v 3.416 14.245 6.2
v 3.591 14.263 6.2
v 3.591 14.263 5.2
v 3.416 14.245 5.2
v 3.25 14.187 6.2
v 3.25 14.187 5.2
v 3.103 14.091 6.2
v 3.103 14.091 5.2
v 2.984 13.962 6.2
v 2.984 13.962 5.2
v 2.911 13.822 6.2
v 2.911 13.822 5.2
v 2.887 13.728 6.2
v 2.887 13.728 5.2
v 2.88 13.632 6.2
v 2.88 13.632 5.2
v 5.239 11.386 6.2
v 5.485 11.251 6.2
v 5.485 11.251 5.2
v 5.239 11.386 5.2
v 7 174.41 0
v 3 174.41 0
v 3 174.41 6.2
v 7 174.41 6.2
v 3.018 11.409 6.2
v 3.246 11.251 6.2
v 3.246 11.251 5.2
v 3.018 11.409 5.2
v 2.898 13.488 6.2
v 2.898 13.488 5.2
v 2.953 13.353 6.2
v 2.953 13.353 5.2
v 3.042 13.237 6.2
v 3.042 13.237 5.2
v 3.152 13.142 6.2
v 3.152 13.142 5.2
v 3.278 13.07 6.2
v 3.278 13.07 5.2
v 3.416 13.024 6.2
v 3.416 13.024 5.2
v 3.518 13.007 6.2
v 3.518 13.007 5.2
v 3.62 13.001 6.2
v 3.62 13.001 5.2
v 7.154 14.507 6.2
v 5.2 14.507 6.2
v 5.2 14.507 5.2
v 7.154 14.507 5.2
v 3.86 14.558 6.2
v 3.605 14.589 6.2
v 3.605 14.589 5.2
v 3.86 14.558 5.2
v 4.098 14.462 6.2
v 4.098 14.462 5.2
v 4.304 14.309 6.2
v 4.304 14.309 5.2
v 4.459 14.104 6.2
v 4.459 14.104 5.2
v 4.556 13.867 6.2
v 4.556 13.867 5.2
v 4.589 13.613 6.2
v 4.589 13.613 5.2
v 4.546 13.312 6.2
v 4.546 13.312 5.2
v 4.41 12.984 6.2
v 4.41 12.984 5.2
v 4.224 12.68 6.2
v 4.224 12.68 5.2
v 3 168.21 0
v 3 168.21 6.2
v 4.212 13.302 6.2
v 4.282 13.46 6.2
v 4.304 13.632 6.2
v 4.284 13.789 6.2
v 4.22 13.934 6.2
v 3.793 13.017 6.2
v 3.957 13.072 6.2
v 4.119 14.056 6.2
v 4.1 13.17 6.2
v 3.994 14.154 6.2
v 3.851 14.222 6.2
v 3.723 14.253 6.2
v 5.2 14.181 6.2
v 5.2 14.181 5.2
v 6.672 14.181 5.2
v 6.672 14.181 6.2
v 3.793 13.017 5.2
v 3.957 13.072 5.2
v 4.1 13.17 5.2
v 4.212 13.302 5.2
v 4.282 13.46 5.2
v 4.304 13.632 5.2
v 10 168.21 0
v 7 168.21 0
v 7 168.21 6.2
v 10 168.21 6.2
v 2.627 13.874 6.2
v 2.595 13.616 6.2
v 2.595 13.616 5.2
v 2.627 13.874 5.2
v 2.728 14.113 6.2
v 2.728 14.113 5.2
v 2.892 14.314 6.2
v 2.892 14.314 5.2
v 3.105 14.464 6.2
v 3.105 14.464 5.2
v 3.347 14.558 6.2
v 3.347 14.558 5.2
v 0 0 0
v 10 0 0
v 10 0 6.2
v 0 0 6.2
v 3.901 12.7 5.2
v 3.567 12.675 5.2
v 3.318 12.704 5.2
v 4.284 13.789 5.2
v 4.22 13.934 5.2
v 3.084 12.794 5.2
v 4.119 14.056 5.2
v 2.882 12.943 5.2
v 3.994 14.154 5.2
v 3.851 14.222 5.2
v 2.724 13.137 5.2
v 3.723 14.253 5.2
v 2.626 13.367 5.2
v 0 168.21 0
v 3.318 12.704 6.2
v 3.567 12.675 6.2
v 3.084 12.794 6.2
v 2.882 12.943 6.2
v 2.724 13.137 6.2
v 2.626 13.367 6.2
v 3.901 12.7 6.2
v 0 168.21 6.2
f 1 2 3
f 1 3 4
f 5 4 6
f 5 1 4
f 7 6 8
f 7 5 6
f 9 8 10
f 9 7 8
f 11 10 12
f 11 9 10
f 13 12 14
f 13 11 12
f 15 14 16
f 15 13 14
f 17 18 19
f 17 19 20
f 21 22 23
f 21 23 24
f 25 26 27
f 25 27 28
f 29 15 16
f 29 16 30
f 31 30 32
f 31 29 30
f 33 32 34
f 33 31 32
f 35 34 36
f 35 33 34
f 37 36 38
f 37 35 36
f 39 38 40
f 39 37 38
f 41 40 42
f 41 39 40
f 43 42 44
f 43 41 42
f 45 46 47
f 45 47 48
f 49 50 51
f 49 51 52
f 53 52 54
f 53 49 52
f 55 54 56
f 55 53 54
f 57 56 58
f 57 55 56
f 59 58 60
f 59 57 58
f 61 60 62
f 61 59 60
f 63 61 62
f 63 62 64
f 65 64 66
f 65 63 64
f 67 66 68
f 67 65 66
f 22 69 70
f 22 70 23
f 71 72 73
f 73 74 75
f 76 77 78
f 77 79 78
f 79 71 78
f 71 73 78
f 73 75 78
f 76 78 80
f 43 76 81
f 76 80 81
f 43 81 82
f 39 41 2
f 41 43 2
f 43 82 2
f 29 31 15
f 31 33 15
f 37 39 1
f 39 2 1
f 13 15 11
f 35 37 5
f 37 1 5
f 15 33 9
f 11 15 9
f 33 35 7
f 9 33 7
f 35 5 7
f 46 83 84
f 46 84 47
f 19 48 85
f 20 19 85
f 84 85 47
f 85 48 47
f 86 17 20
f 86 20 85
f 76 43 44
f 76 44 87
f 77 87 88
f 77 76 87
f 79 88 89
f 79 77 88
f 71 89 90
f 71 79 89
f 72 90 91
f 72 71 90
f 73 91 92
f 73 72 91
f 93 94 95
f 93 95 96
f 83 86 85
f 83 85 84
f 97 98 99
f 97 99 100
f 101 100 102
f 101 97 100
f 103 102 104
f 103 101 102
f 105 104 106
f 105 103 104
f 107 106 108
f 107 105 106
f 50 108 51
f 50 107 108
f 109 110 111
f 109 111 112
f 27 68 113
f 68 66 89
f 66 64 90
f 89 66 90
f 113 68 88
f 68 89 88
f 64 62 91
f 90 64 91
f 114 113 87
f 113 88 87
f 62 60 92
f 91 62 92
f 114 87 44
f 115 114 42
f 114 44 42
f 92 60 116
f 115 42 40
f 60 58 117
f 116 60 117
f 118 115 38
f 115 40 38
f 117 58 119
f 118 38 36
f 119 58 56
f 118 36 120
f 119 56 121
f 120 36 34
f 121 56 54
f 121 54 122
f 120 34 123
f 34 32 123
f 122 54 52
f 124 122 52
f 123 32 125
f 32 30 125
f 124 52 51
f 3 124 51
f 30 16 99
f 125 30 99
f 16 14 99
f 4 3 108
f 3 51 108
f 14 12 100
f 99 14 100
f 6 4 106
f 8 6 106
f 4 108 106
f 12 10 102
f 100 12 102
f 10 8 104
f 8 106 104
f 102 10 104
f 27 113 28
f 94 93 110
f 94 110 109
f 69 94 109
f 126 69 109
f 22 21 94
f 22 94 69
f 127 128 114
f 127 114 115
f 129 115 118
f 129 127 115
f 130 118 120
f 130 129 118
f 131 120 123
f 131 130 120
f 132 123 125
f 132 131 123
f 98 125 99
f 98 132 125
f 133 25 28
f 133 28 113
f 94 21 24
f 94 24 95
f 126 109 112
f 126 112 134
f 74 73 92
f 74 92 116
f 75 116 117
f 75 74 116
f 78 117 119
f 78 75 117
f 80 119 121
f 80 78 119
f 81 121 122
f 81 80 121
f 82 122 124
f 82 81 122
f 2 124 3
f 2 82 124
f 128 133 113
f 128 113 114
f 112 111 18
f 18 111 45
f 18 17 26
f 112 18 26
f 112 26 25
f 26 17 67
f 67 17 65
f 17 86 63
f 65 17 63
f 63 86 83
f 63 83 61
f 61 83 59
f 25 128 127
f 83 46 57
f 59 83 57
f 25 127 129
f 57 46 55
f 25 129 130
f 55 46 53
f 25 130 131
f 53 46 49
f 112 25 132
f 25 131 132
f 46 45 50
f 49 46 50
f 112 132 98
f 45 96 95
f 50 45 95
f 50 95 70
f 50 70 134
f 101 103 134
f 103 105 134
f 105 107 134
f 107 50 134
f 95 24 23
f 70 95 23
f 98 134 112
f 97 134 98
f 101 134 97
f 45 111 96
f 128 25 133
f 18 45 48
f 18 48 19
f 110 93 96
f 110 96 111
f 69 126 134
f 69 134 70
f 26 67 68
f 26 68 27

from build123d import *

# Parameters (mm, degrees)
BOSS_EXTRUDE1_DEPTH = 6.2
CUT_EXTRUDE1_DEPTH  = 1


with BuildPart() as part:
    # Sketch1 → Boss-Extrude1 (new body)
    with BuildSketch(Plane.XY):
        Polygon((0, 0), (0, 168.21), (3, 168.21), (3, 174.41), (7, 174.41), (7, 168.21), (10, 168.21), (10, 0), align=None)
    extrude(amount=BOSS_EXTRUDE1_DEPTH)

    # Sketch4 → Cut-Extrude1 (cut)
    with BuildSketch(Plane.XY.offset(6.2)):
        with BuildLine():
            Line((3.246096477, 11.250682627), (3.018402166, 11.409051017))
            Line((3.018402166, 11.409051017), (3.901194634, 12.699530784))
            add(Edge.make_bspline(
                [(3.901194634, 12.699530784), (3.844869467, 12.692642791), (3.733962072, 12.679079948), (3.62225913, 12.67658834), (3.567285379, 12.675362114)],
                knots=[0, 0, 0, 0, 0.000170115, 0.000334967, 0.000334967, 0.000334967, 0.000334967], degree=3))
            add(Edge.make_bspline(
                [(3.567285379, 12.675362114), (3.533955093, 12.676215805), (3.468530656, 12.677891525), (3.3723448, 12.691173737), (3.279920041, 12.711629925), (3.191501411, 12.742154152), (3.106756575, 12.780089242), (3.025870535, 12.827130962), (2.948952177, 12.882472383), (2.876827598, 12.945820883), (2.81123052, 13.01537883), (2.752789386, 13.088998592), (2.704219931, 13.167535365), (2.663873314, 13.249387065), (2.633274974, 13.335730147), (2.610993243, 13.425582103), (2.597275107, 13.519572664), (2.595643071, 13.583549033), (2.594814426, 13.616032186)],
                knots=[0, 0, 0, 0, 9.9954e-05, 0.000196201, 0.000290782, 0.000383503, 0.000476303, 0.000568919, 0.000663705, 0.000760153, 0.000856434, 0.000950205, 0.001041624, 0.001132931, 0.001223461, 0.001315861, 0.001410305, 0.001507717, 0.001507717, 0.001507717, 0.001507717], degree=3))
            add(Edge.make_bspline(
                [(2.594814426, 13.616032186), (2.596387806, 13.66045375), (2.599476032, 13.747644268), (2.624330401, 13.875037758), (2.665206566, 13.995494123), (2.722200879, 14.108696656), (2.793987377, 14.213016941), (2.880264455, 14.307004751), (2.980507337, 14.389323296), (3.092432454, 14.460084138), (3.213402694, 14.516993743), (3.34010212, 14.558939394), (3.471559929, 14.583612544), (3.560612029, 14.586865432), (3.605446437, 14.58850314)],
                knots=[0, 0, 0, 0, 0.000133185, 0.000261414, 0.000387724, 0.00051373, 0.000640399, 0.00076644, 0.000895188, 0.001028407, 0.001162697, 0.001295241, 0.001427846, 0.0015623, 0.0015623, 0.0015623, 0.0015623], degree=3))
            add(Edge.make_bspline(
                [(3.605446437, 14.58850314), (3.649432361, 14.586842921), (3.736344399, 14.583562484), (3.864150855, 14.55953774), (3.986561635, 14.519045901), (4.102898159, 14.46308919), (4.210611768, 14.392948081), (4.307472683, 14.309368906), (4.391270493, 14.212299606), (4.461867871, 14.104087904), (4.518537122, 13.987822143), (4.559424121, 13.866461013), (4.584593379, 13.740877316), (4.587765048, 13.655792329), (4.589365708, 13.612852098)],
                knots=[0, 0, 0, 0, 0.000131915, 0.000260652, 0.000388569, 0.000517718, 0.000646848, 0.000773094, 0.000900237, 0.001030248, 0.001159674, 0.001287189, 0.001413545, 0.001542287, 0.001542287, 0.001542287, 0.001542287], degree=3))
            add(Edge.make_bspline(
                [(4.589365708, 13.612852098), (4.588296723, 13.579520252), (4.586128553, 13.51191494), (4.570946332, 13.409198844), (4.545165164, 13.304468086), (4.515908266, 13.215820638), (4.487666942, 13.142606544), (4.46108663, 13.084774754), (4.431593462, 13.023904322), (4.397195725, 12.960633523), (4.360218499, 12.894155795), (4.318436155, 12.825137902), (4.272801815, 12.75348723), (4.24029914, 12.705184514), (4.223655572, 12.680450255)],
                knots=[0, 0, 0, 0, 9.9984e-05, 0.000202793, 0.000310776, 0.000423207, 0.000482616, 0.000546097, 0.000614079, 0.0006855, 0.000762103, 0.000842274, 0.000927493, 0.001016928, 0.001016928, 0.001016928, 0.001016928], degree=3))
            Line((4.223655572, 12.680450255), (3.246096477, 11.250682627))
        make_face()
        with BuildLine():
            add(Edge.make_bspline(
                [(3.620074842, 13.00100314), (3.64532427, 13.001692917), (3.69447632, 13.003035677), (3.76648287, 13.011208347), (3.834449826, 13.025699034), (3.898558745, 13.046490487), (3.959452435, 13.071579037), (4.016163675, 13.103521339), (4.068739929, 13.141636429), (4.117533263, 13.184462657), (4.160862034, 13.23204283), (4.199454641, 13.281842348), (4.232257441, 13.334079815), (4.258168414, 13.389409418), (4.279472279, 13.446484314), (4.294184333, 13.506223622), (4.302334406, 13.5683161), (4.303723764, 13.610497025), (4.30442981, 13.631932627)],
                knots=[0, 0, 0, 0, 7.5753e-05, 0.000147465, 0.000217073, 0.000283852, 0.000349411, 0.000414338, 0.000478589, 0.000543925, 0.000608743, 0.000671332, 0.000732749, 0.000793345, 0.000854313, 0.000915245, 0.00097749, 0.001041807, 0.001041807, 0.001041807, 0.001041807], degree=3))
            add(Edge.make_bspline(
                [(4.30442981, 13.631932627), (4.303822325, 13.653377181), (4.3026252, 13.695636304), (4.293021007, 13.75782071), (4.276125268, 13.817413883), (4.253455329, 13.874742073), (4.22359197, 13.929334267), (4.187756665, 13.981875865), (4.145182229, 14.032033724), (4.096194187, 14.078628195), (4.043367128, 14.121579503), (3.987069388, 14.159485444), (3.927765, 14.191254672), (3.86581577, 14.217470166), (3.801092625, 14.237927848), (3.733633864, 14.252639315), (3.663098603, 14.260777978), (3.615218437, 14.262158554), (3.590818032, 14.262862114)],
                knots=[0, 0, 0, 0, 6.4316e-05, 0.000126743, 0.000188161, 0.000249812, 0.000311283, 0.000374438, 0.00044032, 0.000508243, 0.00057698, 0.000644365, 0.000711521, 0.0007785, 0.000845884, 0.000914871, 0.00098532, 0.001058531, 0.001058531, 0.001058531, 0.001058531], degree=3))
            add(Edge.make_bspline(
                [(3.590818032, 14.262862114), (3.566629835, 14.262157417), (3.519172793, 14.260774807), (3.449264592, 14.252654785), (3.382261961, 14.23782891), (3.317726348, 14.217479642), (3.255778959, 14.191252716), (3.196477368, 14.159483779), (3.14016646, 14.121588229), (3.087390049, 14.0785944), (3.038315505, 14.032250606), (2.996473061, 13.981656139), (2.960555745, 13.929361599), (2.930733421, 13.874734809), (2.908052566, 13.817415821), (2.89115975, 13.757820185), (2.881554771, 13.69563644), (2.880357754, 13.653377227), (2.879750323, 13.631932627)],
                knots=[0, 0, 0, 0, 7.2576e-05, 0.000142393, 0.000210758, 0.000278143, 0.000345121, 0.000412278, 0.000479663, 0.0005484, 0.000616323, 0.000681795, 0.00074495, 0.000806421, 0.000868072, 0.00092949, 0.000991917, 0.001056233, 0.001056233, 0.001056233, 0.001056233], degree=3))
            add(Edge.make_bspline(
                [(2.879750323, 13.631932627), (2.880299985, 13.610480333), (2.881384018, 13.568172481), (2.89184137, 13.506009253), (2.909329524, 13.446420677), (2.9327514, 13.38882735), (2.963595699, 13.333789308), (3.00144519, 13.281567487), (3.045809507, 13.2315699), (3.096095599, 13.184573357), (3.151130288, 13.141436741), (3.209910193, 13.103762752), (3.271423403, 13.071947034), (3.335886453, 13.046418779), (3.402821622, 13.02590677), (3.472830491, 13.011235054), (3.545681535, 13.003114069), (3.595039161, 13.001713534), (3.620074842, 13.00100314)],
                knots=[0, 0, 0, 0, 6.4316e-05, 0.000126844, 0.000188436, 0.000250326, 0.000312966, 0.000377217, 0.000443451, 0.000513196, 0.000583426, 0.000652939, 0.000722346, 0.000790847, 0.000860662, 0.000932137, 0.001005113, 0.00108023, 0.00108023, 0.00108023, 0.00108023], degree=3))
        make_face(mode=Mode.SUBTRACT)
        Polygon((5.199942631, 14.507092884), (7.153788785, 14.507092884), (5.484878528, 11.250682627), (5.238739706, 11.386154382), (6.671687423, 14.181451858), (5.199942631, 14.181451858), align=None)
    extrude(amount=-CUT_EXTRUDE1_DEPTH, mode=Mode.SUBTRACT)


solid = part.part
